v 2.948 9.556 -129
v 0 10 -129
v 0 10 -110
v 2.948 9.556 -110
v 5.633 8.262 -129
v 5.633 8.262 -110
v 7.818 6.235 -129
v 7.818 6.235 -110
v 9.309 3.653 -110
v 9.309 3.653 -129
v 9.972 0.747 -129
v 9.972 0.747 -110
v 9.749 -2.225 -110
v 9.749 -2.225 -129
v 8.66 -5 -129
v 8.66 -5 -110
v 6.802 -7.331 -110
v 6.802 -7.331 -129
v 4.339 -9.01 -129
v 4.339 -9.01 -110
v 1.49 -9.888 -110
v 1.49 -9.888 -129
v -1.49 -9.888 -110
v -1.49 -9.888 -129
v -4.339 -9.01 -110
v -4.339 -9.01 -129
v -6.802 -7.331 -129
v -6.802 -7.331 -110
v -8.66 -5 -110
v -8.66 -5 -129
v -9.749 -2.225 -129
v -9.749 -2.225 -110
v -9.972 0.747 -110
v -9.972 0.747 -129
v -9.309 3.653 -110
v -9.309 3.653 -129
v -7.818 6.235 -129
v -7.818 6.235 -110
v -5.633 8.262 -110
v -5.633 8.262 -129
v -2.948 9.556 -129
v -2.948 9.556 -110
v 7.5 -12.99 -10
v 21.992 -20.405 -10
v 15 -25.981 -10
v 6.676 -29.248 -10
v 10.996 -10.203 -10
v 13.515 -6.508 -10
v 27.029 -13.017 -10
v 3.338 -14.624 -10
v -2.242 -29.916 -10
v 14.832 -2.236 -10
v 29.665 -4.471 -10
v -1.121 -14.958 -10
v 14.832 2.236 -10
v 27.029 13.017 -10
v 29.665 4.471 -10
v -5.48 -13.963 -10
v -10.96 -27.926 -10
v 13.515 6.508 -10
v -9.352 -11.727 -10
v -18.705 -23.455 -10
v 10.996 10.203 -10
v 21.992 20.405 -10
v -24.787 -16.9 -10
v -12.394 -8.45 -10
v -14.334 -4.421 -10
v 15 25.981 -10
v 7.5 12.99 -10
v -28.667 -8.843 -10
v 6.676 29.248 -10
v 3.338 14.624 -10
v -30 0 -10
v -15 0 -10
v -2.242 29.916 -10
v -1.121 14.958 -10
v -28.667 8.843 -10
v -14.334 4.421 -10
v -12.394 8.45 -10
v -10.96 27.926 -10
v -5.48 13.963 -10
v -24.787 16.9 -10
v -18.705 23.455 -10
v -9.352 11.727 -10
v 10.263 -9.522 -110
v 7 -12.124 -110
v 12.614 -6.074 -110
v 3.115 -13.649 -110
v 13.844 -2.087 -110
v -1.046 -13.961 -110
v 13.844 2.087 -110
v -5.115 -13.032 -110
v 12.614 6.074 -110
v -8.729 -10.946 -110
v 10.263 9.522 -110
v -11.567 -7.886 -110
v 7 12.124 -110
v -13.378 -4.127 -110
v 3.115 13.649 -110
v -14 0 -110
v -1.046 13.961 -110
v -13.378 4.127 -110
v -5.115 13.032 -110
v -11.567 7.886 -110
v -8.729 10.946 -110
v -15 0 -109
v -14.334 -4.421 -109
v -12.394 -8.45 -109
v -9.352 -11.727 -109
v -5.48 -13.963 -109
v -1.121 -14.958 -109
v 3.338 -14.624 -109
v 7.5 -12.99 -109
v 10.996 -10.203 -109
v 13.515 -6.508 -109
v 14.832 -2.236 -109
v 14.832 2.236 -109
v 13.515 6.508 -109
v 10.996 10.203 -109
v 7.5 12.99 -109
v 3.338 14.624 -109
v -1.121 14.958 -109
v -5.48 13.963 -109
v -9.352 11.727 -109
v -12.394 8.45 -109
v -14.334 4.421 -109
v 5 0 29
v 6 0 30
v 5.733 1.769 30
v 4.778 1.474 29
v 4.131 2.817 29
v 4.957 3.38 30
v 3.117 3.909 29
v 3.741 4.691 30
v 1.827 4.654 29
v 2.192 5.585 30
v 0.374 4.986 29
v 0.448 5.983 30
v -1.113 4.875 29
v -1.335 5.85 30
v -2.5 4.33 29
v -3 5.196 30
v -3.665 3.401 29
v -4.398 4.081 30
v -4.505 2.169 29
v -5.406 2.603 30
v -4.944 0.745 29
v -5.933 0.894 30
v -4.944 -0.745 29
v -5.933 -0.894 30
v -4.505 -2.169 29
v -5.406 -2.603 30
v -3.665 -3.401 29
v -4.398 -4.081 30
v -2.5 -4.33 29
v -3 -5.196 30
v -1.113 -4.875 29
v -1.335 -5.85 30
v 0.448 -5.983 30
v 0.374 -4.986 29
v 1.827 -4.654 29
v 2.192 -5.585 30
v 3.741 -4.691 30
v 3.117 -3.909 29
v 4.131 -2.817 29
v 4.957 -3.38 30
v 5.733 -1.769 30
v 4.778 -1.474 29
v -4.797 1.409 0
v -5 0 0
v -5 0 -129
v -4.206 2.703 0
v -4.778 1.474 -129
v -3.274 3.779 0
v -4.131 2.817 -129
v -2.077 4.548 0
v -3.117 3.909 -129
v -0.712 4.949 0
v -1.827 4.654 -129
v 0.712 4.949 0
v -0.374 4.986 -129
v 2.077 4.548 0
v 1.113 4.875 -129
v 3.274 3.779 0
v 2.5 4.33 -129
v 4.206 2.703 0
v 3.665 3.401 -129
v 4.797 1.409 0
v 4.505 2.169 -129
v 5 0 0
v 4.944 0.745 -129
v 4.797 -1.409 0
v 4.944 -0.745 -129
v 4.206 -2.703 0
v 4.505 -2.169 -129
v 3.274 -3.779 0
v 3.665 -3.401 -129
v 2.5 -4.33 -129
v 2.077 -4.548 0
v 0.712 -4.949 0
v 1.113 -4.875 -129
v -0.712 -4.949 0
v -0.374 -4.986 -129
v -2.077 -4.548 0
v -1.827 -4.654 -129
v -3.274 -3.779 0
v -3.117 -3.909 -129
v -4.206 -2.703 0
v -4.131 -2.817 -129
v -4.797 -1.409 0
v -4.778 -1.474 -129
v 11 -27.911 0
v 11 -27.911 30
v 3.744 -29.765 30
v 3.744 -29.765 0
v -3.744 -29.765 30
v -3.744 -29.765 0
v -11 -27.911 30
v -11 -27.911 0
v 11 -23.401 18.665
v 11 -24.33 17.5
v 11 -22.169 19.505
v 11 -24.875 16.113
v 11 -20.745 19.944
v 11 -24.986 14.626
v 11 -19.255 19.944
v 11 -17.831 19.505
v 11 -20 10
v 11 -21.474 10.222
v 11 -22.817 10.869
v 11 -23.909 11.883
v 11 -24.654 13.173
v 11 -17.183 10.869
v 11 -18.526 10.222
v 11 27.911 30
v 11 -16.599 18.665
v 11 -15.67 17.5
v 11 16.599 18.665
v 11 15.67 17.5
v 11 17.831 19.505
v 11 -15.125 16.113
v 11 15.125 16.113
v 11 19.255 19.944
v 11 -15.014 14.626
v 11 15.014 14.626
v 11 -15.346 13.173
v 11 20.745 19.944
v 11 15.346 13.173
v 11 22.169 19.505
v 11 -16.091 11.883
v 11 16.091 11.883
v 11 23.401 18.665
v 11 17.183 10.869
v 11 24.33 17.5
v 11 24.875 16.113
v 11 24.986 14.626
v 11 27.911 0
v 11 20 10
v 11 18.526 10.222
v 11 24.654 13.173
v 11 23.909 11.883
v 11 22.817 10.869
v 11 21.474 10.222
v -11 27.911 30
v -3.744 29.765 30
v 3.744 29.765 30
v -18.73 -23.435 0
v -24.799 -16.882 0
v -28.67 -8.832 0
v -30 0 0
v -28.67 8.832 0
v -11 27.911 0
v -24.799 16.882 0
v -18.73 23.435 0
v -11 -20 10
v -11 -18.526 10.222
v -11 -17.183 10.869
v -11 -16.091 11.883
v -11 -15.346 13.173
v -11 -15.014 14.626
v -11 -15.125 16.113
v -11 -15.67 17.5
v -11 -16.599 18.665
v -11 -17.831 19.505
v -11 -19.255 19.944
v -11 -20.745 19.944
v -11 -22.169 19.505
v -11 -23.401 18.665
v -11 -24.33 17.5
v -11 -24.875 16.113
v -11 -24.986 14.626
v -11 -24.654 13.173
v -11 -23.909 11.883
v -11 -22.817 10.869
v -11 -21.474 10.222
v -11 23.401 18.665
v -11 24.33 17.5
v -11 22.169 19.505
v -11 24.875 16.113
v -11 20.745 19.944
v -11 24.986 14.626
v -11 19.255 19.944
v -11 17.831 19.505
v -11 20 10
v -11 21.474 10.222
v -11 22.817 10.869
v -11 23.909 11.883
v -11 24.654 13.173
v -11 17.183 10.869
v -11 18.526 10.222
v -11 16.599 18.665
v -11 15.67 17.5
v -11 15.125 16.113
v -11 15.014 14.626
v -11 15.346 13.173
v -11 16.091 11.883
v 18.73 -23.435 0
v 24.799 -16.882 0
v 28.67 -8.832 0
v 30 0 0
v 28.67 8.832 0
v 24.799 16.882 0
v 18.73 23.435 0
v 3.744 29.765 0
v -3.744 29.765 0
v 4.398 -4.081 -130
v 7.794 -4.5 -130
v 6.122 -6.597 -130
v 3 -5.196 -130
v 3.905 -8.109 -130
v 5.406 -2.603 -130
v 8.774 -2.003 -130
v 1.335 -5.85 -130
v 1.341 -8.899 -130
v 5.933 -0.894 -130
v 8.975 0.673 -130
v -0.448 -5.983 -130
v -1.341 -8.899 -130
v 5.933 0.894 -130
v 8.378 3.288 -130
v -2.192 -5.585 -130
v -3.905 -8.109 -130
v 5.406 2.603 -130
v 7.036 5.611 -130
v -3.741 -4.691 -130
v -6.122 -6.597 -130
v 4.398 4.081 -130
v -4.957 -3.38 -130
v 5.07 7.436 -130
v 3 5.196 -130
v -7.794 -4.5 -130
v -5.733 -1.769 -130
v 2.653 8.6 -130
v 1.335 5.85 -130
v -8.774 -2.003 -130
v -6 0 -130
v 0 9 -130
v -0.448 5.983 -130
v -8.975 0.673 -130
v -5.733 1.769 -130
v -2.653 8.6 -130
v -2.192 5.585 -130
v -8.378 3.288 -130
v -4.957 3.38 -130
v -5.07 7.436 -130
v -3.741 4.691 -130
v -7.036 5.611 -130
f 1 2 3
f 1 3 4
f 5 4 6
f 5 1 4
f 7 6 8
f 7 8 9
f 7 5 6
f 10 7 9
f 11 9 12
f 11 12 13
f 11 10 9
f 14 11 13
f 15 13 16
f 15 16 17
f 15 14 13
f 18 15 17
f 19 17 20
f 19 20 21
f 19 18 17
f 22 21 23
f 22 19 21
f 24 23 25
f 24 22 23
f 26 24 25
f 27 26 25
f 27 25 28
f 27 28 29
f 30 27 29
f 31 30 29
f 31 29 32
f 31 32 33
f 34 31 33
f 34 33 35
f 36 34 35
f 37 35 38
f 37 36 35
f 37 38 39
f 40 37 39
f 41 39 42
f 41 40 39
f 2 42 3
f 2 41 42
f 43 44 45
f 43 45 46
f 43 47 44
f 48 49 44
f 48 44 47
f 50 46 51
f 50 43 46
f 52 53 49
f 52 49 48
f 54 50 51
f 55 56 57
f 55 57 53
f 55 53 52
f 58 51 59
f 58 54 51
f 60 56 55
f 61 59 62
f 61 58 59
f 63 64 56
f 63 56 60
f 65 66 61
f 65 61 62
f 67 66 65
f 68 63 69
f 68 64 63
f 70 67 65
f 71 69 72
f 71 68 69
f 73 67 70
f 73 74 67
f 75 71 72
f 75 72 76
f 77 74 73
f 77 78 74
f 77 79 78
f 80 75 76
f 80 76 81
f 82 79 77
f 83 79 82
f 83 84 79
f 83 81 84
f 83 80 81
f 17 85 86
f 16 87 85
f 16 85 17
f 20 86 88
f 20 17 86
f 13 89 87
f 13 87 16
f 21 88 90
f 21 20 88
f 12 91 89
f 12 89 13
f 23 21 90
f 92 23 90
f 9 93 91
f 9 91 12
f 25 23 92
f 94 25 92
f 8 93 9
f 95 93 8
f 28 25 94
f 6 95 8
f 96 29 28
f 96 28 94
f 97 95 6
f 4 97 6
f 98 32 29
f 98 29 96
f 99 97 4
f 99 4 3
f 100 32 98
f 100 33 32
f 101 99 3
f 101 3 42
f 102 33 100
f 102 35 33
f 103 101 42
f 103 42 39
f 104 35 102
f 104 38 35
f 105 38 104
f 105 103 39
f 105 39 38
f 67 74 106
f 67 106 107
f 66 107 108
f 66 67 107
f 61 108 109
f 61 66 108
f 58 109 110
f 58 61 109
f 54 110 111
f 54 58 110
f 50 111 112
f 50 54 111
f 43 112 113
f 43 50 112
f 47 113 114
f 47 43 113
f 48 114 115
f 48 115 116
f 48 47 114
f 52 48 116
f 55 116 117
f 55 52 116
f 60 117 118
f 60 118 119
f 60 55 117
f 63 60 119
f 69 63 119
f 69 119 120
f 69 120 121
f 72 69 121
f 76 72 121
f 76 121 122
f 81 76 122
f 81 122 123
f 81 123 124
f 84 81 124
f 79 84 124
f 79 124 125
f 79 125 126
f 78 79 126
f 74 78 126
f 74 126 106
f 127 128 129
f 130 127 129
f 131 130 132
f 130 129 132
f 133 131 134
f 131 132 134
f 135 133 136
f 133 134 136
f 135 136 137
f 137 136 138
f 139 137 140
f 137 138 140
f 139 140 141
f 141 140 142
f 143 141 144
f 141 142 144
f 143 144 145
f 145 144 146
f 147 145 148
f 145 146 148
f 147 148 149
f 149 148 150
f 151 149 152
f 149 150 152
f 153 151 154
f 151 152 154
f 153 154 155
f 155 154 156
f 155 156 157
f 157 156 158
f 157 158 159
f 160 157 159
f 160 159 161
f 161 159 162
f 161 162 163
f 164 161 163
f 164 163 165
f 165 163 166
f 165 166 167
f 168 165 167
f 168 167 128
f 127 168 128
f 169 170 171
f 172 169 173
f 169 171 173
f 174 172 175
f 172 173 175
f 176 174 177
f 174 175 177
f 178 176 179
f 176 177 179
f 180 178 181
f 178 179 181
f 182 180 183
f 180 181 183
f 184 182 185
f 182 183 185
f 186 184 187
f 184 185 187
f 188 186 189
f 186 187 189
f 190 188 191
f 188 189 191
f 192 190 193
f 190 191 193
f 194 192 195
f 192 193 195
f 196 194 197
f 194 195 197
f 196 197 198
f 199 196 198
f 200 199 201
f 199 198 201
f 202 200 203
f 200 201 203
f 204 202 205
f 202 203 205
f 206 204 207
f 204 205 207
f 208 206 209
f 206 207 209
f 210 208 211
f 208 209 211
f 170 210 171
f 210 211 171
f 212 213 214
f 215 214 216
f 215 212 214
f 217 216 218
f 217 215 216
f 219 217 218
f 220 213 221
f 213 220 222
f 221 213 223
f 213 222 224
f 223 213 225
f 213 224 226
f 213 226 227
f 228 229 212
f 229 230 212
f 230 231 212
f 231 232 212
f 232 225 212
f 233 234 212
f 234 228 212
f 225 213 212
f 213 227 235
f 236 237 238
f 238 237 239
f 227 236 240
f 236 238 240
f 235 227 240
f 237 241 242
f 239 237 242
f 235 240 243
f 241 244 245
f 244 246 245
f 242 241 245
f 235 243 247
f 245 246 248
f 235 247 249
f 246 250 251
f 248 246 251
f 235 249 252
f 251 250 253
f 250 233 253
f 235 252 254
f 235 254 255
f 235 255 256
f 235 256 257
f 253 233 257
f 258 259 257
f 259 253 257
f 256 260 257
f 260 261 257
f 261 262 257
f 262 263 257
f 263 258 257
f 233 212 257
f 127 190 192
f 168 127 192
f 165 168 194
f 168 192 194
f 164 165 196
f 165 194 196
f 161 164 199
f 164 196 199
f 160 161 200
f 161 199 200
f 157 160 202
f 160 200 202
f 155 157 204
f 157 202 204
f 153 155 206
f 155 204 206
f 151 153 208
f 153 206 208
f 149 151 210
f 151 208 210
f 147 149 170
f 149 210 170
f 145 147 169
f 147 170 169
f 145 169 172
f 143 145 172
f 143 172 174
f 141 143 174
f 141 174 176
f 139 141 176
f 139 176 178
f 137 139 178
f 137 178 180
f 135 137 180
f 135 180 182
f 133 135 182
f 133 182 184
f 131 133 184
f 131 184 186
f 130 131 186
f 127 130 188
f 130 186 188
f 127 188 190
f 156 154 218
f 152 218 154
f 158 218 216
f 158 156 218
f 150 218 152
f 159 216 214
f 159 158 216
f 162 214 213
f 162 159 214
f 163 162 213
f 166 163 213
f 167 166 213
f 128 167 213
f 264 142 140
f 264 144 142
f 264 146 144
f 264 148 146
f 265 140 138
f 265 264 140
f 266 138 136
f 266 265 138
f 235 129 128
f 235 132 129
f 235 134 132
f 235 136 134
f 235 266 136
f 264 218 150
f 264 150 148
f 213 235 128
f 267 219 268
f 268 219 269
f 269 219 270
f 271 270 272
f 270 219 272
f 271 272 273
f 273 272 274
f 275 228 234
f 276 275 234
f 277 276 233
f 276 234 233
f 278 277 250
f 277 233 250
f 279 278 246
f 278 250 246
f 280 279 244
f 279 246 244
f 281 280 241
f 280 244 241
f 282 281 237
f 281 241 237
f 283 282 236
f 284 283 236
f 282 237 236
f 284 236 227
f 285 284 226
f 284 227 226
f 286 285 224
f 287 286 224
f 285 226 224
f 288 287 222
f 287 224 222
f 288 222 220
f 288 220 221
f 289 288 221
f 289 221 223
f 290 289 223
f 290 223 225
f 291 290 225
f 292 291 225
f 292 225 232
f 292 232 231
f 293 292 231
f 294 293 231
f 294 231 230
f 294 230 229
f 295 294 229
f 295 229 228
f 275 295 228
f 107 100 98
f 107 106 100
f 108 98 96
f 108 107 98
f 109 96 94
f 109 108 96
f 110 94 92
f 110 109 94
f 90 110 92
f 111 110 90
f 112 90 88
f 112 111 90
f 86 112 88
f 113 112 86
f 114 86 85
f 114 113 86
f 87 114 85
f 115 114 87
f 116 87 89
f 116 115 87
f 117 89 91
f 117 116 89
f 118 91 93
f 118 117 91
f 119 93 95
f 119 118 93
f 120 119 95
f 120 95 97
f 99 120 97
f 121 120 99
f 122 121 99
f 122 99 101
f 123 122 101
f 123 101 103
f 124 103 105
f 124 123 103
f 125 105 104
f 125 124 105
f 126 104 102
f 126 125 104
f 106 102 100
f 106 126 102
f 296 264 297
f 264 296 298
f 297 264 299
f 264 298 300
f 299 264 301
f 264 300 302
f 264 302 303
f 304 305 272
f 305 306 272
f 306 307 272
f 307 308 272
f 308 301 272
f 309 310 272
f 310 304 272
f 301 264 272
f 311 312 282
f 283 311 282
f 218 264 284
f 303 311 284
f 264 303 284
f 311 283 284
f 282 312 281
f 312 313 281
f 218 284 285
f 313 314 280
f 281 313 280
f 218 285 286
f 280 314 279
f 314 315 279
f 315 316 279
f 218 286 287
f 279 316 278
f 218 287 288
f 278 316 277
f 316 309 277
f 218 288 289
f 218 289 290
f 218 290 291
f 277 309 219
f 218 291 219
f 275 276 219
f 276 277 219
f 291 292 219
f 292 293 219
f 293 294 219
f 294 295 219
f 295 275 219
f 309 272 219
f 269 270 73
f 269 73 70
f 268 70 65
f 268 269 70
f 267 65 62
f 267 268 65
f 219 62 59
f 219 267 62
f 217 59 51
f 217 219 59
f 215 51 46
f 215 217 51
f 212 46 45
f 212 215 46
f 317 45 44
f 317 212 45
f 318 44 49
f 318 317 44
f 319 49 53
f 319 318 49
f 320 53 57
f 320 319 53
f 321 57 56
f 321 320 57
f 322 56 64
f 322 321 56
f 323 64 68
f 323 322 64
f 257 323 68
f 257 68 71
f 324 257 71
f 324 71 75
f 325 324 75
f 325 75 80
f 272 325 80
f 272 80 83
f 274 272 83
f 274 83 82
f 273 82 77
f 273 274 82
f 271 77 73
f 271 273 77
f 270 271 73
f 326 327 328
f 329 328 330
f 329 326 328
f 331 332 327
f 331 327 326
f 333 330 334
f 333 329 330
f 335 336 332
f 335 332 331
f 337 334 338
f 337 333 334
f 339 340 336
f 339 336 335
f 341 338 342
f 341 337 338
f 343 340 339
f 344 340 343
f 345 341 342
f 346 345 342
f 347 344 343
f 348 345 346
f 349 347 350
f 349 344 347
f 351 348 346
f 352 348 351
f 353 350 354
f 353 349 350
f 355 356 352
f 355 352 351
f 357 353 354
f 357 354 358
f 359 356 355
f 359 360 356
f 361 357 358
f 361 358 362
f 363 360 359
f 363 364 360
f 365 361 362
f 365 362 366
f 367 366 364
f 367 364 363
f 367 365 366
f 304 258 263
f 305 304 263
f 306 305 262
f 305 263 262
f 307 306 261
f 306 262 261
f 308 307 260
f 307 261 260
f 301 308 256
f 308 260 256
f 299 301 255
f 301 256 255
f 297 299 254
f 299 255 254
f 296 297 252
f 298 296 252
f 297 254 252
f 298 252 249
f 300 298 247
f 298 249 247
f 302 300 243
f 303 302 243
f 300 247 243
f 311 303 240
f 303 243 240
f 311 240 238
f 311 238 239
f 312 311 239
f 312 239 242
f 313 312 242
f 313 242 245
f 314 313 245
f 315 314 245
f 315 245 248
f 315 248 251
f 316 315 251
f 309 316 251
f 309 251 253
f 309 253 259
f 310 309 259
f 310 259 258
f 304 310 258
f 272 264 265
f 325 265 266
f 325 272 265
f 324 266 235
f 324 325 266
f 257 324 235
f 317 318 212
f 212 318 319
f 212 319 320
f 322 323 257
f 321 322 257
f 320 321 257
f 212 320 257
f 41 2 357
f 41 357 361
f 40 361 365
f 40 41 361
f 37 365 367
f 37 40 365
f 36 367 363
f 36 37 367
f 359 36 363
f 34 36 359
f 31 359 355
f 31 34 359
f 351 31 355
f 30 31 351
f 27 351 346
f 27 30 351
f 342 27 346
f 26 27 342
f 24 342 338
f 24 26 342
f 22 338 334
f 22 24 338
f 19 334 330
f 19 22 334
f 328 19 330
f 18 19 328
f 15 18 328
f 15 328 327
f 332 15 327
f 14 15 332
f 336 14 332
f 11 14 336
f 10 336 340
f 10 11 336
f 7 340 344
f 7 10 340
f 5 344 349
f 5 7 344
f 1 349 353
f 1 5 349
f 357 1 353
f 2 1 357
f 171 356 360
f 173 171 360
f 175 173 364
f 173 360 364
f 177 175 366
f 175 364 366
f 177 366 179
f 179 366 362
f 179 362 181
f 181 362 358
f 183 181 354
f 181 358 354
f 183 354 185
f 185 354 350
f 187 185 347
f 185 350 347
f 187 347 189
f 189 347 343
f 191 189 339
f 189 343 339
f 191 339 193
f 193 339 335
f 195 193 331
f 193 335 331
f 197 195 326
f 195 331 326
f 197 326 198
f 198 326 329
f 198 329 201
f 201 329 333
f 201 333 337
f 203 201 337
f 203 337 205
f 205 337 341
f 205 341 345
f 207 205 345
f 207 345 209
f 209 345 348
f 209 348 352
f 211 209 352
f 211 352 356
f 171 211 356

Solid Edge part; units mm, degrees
sketch "Sketch1" plane through (0, 0, 0) normal (0, -1, 0) x (1, 0, 0)
  line L0 (-30, 0) -> (-5, 0)
  line L1 (-5, 0) -> (-5, -130)
  line L2 (-5, -130) -> (-15, -130)
  line L3 (-15, -130) -> (-15, -10)
  line L4 (-15, -10) -> (-30, -10)
  line L5 (-30, -10) -> (-30, 0)
  dimension "D1" = 15
  dimension "D2" = 5
  dimension "D3" = 130
  dimension "D4" = 10
  dimension "D5" = 30
  dimension "D6" = 120
revolve "RevolvedProtrusion1" add sketch "Sketch1" angle 360 about axis through (0, 0, 54) along (0, 0, -1)
sketch "Sketch2" plane through (0, 0, -130) normal (0, 0, -1) x (0, 1, 0)
  circle A0 centre (0, 0) radius 10
  circle A1 centre (0, 0) radius 15
  dimension "D1" = 20
extrude "Cutout1" cut sketch "Sketch2" against normal blind 20
cosmetic_thread "Thread1" size "M20"
sketch "Sketch3" plane through (0, 0, 0) normal (0, 0, 1) x (1, 0, 0)
  circle A0 centre (0, 0) radius 30
  circle A1 centre (0, 0) radius 5
extrude "Ausprägung_1" add sketch "Sketch3" along normal blind 30
sketch "Sketch4" plane through (0, 0, 0) normal (0, 0, 1) x (1, 0, 0)
  line L0 (-61, 50) -> (-11, 50)
  line L1 (-11, 50) -> (-11, -50)
  line L2 (-11, -50) -> (-61, -50)
  line L3 (-61, -50) -> (-61, 50)
  dimension "D1" = 50
  dimension "D2" = 100
  dimension "D3" = 11
extrude "Cutout2" cut sketch "Sketch4" along normal up to next
mirror "Mirror1" about plane through (0, 0, 0) normal (1, 0, 0) of "Cutout2"
hole "Bohrung_1" at (11, -20, 15) direction (-1, 0, 0) diameter 10 end through all
hole "Hole1" at (11, 20, 15) direction (-1, 0, 0) diameter 10 end through all
extrude "Cutout4" [suppressed]
chamfer "Fase_2" distance 1 angle 45 2 edges at (0, -15, -110) (0, -10, -130)
chamfer "Fase_3" distance 1 angle 45 2 edges at (-5, 0, 30) (5, 0, -130)
properties material "Stahl"
